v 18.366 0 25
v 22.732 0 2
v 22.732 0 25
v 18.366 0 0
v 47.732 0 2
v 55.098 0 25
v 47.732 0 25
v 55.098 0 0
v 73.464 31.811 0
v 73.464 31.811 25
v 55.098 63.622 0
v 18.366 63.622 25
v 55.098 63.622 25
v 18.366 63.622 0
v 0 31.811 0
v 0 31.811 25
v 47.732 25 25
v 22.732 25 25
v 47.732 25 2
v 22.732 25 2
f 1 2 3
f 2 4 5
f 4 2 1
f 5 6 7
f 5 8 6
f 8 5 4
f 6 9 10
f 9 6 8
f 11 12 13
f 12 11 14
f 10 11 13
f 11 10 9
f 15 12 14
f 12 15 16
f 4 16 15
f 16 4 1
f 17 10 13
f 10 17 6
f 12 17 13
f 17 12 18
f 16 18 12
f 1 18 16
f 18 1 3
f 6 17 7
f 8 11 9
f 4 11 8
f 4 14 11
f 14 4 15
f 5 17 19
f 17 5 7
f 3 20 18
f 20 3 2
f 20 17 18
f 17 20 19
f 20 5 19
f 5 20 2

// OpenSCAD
// Test: HexBox without lid
include <../boardgame_insert_toolkit_lib.3.scad>;
include <../bit_functions_lib.3.scad>;
g_default_font = "Liberation Sans:style=Regular";

g_b_print_lid = true;
g_b_print_box = true;
g_isolated_print_box = "";

data = [
    [ "hexbox no lid",
        [
            [ TYPE, HEXBOX ],
            [ HEXBOX_SIZE_DZ, [70, 25] ],
            [ BOX_NO_LID_B, t ],
            [ BOX_COMPONENT, [
                [ CMP_COMPARTMENT_SIZE_XYZ, [25, 25, 23] ],
                [ CMP_NUM_COMPARTMENTS_XY, [1, 1] ],
            ]],
        ]
    ],
];

MakeAll();
